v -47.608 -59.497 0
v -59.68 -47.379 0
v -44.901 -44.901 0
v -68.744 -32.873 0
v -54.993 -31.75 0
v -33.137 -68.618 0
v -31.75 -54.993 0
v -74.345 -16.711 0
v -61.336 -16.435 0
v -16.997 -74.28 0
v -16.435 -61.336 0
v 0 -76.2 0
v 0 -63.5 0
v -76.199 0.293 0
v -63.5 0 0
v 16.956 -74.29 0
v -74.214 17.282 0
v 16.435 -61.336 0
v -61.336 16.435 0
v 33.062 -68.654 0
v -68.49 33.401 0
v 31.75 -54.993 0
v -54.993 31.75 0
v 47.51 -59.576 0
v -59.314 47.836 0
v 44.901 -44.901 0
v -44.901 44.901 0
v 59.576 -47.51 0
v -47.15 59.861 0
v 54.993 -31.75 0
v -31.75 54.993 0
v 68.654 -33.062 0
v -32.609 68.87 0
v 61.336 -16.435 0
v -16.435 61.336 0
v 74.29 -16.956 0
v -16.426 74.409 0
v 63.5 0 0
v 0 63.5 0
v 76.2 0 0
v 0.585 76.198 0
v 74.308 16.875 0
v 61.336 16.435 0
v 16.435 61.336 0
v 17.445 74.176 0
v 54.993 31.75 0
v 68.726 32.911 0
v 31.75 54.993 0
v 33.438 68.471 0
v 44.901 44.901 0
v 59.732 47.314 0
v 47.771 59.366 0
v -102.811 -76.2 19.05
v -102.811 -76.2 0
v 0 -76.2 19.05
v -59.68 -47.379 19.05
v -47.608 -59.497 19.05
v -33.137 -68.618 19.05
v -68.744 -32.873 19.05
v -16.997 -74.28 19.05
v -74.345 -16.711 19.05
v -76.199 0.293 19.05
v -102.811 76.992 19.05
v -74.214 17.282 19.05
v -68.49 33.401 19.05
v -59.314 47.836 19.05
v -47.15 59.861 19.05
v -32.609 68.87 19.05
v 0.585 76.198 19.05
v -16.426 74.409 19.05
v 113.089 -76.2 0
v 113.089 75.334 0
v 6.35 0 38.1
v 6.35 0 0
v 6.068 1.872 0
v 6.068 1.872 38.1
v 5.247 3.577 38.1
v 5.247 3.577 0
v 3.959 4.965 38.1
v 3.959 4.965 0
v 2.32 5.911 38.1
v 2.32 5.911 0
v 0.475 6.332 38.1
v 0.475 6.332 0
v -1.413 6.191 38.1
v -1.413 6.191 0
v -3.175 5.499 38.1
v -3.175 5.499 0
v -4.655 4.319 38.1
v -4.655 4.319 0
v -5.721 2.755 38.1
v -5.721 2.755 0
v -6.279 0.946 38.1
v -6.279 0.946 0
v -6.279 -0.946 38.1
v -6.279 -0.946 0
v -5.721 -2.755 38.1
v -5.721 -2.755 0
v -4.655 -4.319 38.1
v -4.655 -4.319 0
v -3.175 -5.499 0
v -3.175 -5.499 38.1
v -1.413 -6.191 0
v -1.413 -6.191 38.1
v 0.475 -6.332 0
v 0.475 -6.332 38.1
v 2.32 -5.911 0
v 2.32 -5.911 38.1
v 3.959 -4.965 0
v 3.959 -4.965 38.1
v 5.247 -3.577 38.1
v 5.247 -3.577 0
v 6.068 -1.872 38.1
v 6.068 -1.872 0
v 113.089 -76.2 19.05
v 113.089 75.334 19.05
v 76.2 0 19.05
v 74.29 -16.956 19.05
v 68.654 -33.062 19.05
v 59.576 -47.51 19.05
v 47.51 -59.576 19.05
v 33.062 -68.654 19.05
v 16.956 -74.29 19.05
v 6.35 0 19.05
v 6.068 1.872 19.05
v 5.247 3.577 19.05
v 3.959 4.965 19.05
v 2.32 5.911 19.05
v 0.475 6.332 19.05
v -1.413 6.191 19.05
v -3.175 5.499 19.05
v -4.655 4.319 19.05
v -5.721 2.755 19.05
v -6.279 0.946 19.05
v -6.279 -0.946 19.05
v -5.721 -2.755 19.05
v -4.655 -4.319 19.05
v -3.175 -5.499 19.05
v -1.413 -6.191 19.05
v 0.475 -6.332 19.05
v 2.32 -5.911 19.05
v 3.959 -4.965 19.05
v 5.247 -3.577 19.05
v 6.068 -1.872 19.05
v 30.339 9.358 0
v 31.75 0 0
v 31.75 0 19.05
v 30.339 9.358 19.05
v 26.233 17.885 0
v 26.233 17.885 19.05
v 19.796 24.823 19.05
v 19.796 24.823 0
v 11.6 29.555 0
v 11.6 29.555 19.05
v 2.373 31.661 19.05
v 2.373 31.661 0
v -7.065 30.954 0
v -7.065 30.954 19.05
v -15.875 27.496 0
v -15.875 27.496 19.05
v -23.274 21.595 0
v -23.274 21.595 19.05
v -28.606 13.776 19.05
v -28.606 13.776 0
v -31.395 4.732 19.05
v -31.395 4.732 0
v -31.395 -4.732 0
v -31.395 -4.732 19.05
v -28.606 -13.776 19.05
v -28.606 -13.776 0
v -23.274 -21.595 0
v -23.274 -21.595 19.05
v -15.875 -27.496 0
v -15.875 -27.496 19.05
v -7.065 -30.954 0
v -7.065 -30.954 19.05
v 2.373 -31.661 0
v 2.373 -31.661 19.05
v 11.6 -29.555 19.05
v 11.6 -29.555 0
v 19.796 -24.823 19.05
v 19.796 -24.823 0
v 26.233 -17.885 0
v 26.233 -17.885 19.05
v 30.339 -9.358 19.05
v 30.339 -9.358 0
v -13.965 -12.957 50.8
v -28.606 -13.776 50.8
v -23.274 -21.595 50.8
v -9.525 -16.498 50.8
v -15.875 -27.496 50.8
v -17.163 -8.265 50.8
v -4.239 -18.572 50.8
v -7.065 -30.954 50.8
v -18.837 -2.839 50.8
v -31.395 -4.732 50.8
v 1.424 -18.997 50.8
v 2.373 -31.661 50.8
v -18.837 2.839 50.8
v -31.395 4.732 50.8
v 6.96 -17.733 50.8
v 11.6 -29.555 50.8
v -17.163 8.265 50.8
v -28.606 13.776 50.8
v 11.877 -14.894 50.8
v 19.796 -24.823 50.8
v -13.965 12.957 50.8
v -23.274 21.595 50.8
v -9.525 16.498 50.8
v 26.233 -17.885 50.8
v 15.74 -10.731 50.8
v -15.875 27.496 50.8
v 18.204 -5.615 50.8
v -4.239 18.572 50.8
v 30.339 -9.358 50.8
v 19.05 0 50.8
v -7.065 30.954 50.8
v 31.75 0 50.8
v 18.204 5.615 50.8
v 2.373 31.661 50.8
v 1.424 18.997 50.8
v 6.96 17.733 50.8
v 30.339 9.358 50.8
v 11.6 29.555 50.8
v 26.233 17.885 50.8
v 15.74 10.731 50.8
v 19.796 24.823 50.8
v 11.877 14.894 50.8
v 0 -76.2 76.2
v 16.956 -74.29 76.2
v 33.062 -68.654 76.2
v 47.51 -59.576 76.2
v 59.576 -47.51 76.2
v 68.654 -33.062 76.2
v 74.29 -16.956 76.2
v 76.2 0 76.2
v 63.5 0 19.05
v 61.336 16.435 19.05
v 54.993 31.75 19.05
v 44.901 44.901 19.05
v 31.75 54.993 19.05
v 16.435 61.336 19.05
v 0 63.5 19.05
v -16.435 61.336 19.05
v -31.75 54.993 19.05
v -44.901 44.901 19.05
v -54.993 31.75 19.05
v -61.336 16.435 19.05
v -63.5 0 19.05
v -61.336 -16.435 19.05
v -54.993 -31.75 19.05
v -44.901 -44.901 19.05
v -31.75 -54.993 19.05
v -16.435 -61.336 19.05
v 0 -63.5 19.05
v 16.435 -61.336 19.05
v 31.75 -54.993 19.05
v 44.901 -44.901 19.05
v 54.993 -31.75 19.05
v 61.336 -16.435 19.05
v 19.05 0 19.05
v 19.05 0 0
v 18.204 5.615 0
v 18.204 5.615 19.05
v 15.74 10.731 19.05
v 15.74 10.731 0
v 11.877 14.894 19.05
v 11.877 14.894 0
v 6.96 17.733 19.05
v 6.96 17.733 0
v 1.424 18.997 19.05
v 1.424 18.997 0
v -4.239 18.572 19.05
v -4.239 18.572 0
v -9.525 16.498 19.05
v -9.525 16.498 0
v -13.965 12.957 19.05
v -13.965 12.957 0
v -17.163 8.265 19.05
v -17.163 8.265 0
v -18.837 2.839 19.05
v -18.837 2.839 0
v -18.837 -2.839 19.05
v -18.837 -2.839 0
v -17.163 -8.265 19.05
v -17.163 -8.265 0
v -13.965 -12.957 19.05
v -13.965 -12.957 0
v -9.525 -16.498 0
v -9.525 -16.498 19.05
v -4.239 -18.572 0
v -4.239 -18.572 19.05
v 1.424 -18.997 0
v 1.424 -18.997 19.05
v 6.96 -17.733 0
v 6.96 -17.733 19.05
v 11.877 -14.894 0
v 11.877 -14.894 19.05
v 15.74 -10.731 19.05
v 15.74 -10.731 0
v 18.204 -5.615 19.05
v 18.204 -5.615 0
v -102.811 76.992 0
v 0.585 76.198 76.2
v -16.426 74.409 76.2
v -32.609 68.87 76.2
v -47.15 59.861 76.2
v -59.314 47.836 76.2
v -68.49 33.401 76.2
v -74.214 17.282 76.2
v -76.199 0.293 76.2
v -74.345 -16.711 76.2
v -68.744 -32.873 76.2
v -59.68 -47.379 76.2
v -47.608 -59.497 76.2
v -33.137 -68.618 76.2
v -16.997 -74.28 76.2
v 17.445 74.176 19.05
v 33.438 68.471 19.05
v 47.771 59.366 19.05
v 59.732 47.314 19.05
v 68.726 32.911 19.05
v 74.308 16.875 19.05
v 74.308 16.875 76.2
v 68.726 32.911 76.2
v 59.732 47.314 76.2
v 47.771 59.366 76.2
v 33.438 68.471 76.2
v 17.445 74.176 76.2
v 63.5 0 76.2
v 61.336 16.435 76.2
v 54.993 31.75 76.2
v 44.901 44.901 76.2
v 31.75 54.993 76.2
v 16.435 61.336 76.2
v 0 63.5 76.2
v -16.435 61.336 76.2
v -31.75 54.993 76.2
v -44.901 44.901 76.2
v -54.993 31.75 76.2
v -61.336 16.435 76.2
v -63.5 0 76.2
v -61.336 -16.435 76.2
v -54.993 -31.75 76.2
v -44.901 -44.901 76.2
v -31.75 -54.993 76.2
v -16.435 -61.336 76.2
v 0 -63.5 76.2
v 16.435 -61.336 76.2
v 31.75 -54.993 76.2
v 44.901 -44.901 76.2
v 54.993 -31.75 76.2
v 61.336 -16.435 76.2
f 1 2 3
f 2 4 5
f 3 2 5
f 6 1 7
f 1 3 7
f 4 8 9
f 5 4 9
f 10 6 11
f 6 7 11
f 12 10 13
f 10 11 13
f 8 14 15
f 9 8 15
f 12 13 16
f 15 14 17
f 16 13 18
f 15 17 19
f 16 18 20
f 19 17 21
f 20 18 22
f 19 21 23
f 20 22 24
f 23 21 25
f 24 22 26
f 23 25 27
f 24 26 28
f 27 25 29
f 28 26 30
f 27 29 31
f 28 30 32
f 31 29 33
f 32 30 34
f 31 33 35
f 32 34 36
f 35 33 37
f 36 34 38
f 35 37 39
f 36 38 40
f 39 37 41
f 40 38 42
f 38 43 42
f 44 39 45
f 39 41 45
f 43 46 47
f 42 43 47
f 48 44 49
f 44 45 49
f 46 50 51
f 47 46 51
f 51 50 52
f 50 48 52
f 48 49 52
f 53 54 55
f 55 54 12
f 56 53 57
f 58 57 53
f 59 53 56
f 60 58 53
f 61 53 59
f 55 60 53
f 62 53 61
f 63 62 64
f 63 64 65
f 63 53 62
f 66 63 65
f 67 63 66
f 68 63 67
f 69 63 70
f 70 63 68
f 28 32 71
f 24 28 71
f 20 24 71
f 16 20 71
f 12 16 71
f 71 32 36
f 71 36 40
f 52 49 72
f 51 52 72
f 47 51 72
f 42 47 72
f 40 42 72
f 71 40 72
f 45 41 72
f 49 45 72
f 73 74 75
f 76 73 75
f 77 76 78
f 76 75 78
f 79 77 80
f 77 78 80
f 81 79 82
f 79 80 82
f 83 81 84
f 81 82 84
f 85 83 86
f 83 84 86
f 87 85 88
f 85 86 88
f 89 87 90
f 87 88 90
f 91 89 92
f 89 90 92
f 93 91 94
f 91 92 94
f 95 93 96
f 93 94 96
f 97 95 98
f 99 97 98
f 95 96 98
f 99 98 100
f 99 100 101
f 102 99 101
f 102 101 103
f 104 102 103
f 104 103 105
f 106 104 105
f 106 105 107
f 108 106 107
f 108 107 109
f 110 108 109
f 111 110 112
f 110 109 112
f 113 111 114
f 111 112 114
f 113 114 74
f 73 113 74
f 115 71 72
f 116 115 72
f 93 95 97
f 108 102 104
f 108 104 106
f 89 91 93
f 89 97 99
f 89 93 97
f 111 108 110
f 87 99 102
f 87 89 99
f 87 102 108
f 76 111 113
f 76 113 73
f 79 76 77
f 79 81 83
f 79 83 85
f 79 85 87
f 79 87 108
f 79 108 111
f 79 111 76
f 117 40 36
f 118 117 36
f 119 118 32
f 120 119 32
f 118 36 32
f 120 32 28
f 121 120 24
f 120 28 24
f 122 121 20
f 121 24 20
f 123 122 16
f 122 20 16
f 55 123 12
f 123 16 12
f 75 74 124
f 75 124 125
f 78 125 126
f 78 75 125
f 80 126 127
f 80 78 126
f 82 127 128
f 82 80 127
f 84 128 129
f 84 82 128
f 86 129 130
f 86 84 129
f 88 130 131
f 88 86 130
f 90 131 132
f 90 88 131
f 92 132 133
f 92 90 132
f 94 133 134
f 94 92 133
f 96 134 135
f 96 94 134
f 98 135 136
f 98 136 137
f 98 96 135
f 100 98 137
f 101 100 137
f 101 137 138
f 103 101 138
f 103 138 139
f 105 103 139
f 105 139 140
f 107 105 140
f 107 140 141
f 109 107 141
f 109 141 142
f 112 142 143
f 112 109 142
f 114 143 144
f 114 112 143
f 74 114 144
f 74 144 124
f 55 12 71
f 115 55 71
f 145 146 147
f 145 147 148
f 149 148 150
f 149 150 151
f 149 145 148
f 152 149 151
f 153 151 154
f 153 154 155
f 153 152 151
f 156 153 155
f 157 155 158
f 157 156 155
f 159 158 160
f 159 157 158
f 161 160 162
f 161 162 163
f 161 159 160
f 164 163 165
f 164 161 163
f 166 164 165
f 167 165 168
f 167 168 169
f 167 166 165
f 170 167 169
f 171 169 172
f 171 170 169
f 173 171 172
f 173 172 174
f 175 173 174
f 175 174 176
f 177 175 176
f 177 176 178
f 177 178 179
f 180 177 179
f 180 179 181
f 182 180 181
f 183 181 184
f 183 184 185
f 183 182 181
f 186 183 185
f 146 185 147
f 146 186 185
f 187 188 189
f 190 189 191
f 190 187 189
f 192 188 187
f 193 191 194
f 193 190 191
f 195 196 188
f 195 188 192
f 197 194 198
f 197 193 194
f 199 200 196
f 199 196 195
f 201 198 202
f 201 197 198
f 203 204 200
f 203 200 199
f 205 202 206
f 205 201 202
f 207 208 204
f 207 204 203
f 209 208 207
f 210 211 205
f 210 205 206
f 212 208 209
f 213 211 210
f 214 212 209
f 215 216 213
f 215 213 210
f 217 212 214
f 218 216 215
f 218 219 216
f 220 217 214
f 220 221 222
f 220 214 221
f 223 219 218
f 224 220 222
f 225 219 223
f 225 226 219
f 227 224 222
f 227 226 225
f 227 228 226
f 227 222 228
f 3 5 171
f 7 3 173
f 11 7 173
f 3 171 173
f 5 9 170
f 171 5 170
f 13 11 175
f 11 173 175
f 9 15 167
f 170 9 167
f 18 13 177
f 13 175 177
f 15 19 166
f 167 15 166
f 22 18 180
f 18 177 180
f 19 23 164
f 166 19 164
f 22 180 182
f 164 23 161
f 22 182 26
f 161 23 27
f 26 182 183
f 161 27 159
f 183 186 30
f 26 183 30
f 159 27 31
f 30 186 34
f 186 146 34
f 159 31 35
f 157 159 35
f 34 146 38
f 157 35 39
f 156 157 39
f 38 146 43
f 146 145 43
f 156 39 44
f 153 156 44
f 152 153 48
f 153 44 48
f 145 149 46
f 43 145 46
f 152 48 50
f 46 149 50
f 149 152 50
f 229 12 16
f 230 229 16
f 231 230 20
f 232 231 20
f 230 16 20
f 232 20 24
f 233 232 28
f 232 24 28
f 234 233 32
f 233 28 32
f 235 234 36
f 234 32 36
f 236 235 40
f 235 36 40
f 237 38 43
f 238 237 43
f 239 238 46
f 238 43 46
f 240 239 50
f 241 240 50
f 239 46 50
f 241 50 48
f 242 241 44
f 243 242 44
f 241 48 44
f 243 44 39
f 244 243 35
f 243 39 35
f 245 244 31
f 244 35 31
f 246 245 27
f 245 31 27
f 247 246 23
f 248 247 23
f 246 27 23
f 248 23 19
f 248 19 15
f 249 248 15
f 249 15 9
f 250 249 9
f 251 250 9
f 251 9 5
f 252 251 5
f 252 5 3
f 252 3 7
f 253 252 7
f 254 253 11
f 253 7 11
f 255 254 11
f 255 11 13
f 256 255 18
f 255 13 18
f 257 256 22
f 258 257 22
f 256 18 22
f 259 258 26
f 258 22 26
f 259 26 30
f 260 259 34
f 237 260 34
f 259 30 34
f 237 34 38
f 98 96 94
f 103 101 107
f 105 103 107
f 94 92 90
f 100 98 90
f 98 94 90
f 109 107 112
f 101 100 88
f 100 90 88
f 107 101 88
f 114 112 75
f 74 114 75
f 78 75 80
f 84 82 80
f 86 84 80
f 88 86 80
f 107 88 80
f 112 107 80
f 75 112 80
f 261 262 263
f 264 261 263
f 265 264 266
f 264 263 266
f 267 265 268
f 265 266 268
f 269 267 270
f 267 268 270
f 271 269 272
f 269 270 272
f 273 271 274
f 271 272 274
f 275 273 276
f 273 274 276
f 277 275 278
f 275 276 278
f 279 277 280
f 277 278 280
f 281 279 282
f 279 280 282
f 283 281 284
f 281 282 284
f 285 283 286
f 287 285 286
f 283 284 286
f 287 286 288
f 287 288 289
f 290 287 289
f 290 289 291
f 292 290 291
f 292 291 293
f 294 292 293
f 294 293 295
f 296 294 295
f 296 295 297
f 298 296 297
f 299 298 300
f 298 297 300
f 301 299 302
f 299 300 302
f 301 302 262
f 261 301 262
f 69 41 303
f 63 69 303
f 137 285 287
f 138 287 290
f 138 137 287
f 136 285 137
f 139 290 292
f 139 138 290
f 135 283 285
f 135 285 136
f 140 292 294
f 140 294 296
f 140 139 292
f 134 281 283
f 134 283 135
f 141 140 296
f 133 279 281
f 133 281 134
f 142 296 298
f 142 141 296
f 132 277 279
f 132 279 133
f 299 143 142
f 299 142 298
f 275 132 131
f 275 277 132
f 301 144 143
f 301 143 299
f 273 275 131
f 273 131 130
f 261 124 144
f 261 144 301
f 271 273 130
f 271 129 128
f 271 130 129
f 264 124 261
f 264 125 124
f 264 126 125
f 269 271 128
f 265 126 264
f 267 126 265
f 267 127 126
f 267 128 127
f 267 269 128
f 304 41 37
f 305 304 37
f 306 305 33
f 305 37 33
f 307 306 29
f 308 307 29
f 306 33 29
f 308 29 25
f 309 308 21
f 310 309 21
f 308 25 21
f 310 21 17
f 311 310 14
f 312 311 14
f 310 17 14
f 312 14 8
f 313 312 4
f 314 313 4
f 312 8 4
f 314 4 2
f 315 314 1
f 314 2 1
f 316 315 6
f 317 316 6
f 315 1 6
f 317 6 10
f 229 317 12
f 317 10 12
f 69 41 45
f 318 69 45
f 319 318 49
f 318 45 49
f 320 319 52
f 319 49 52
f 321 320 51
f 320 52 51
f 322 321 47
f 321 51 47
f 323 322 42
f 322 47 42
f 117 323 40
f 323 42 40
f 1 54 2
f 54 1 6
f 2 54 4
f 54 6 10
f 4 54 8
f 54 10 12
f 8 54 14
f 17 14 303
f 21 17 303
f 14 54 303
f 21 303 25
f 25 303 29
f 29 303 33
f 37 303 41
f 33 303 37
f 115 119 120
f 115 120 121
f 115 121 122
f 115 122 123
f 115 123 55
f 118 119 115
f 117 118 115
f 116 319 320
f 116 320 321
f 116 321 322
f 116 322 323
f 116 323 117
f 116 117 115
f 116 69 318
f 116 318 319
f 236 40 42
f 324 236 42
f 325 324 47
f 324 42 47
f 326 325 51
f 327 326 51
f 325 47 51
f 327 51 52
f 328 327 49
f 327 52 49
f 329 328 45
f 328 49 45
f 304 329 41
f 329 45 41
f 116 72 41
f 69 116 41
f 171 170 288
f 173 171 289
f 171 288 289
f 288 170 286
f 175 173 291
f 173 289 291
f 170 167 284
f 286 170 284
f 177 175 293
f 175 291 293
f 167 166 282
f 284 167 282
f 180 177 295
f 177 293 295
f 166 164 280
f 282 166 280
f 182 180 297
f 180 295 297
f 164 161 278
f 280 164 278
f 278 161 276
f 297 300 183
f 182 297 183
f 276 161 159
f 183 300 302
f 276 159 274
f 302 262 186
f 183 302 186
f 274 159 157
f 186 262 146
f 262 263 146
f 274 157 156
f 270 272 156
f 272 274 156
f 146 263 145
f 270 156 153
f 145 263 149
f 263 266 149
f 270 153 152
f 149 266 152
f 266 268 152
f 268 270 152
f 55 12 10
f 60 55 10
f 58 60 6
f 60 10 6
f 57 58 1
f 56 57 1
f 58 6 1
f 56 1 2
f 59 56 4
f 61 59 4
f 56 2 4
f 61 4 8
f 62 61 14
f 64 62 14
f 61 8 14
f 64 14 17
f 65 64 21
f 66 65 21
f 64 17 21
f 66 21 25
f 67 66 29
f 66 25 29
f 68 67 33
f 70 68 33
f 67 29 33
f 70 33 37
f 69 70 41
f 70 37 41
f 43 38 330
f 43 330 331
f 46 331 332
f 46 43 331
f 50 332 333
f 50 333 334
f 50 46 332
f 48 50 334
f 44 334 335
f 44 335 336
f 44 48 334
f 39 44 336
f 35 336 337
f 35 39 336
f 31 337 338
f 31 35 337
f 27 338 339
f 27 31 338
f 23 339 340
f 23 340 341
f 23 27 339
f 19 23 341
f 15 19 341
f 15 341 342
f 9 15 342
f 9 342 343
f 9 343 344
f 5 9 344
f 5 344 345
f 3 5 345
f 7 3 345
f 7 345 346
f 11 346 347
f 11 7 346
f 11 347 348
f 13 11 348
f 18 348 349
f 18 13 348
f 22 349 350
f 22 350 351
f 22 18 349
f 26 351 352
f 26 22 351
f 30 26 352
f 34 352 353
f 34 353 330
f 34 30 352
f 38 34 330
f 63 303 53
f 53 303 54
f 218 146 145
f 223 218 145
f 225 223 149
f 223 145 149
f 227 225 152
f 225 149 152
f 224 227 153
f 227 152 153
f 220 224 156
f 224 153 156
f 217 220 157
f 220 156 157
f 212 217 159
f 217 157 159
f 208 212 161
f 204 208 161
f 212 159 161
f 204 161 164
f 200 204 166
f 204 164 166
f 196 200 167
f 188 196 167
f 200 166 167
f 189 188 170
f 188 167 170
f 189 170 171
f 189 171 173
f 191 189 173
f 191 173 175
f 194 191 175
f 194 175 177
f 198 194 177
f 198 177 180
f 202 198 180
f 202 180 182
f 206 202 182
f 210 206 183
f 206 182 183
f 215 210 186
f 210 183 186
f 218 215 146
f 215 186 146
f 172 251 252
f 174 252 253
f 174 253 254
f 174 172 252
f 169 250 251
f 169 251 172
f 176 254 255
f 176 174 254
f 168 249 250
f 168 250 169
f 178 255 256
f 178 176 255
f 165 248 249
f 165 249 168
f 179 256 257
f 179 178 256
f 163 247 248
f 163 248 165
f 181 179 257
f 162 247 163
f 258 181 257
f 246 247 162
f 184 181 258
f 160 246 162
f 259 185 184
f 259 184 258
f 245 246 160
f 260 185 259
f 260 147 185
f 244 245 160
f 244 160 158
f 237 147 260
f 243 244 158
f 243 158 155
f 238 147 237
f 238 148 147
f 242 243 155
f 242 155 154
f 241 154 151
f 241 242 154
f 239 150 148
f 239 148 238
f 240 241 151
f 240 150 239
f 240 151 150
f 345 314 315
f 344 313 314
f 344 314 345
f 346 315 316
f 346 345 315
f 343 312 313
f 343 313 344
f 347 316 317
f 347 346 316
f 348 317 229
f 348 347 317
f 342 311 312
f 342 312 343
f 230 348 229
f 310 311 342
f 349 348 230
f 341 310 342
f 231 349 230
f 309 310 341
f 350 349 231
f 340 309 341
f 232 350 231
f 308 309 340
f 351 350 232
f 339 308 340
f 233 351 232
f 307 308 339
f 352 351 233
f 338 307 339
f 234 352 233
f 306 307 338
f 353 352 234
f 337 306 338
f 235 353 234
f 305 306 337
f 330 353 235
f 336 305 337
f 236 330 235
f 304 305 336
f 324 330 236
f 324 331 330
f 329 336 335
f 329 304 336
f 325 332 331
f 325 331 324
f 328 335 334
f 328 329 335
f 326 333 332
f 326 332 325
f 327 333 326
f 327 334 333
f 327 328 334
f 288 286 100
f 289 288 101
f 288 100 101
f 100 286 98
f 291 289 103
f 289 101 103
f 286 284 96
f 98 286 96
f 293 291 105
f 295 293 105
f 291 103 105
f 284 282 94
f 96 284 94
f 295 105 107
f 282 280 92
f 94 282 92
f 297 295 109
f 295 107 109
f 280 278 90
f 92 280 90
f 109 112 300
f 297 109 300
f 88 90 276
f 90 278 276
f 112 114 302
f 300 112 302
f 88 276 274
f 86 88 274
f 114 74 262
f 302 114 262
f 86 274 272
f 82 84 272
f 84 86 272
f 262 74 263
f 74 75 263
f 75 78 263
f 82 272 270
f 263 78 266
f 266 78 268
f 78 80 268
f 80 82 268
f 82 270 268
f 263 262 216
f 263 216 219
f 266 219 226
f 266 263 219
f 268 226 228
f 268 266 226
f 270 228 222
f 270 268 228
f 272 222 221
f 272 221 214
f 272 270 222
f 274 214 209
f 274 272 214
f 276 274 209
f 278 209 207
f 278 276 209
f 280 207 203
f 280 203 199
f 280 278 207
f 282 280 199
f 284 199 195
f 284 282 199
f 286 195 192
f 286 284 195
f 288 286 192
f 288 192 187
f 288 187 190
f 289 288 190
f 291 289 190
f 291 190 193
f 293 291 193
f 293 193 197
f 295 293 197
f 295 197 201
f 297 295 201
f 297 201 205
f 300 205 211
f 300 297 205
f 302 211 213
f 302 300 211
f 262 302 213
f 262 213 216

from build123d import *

# Parameters (mm, degrees)
F0_R     = 63.5
F1_DEPTH = 76.2
F0_R_2   = 31.75
F0_R_3   = 19.05
F2_DEPTH = 50.8
F0_R_4   = 6.35
F3_DEPTH = 38.1
F4_DEPTH = 19.05


with BuildPart() as f1:
    # F0 (on Top) → F1 (new body)
    with BuildSketch(Plane.XY):
        with BuildLine():
            ThreePointArc((0, -76.2), (53.881537, -53.881537), (76.2, 0))
            ThreePointArc((76.2, 0), (54.088073, 53.674206), (0.585292, 76.197752))
            ThreePointArc((0.585292, 76.197752), (-76.199438, 0.292648), (0, -76.2))
        make_face()
        Circle(F0_R, mode=Mode.SUBTRACT)
    extrude(amount=F1_DEPTH)


with BuildPart() as f2:
    # F0 (on Top) → F2 (new body)
    with BuildSketch(Plane.XY):
        Circle(F0_R_2)
        Circle(F0_R_3, mode=Mode.SUBTRACT)
    extrude(amount=F2_DEPTH)


with BuildPart() as f3:
    # F0 (on Top) → F3 (new body)
    with BuildSketch(Plane.XY):
        Circle(F0_R_4)
    extrude(amount=F3_DEPTH)


with BuildPart() as f4:
    # F0 (on Top) → F4 (new body)
    with BuildSketch(Plane.XY):
        with BuildLine():
            ThreePointArc((0, -76.2), (-76.199438, 0.292648), (0.585292, 76.197752))
            Line((0.585292, 76.197752), (-102.810882, 76.991962))
            Line((-102.810882, 76.991962), (-102.810882, -76.2))
            Line((-102.810882, -76.2), (0, -76.2))
        make_face()
        with BuildLine():
            ThreePointArc((0.585292, 76.197752), (54.088073, 53.674206), (76.2, 0))
            ThreePointArc((76.2, 0), (53.881537, -53.881537), (0, -76.2))
            Line((0, -76.2), (113.089118, -76.2))
            Line((113.089118, -76.2), (113.089118, 75.333584))
            Line((113.089118, 75.333584), (0.585292, 76.197752))
        make_face()
        Circle(F0_R)
        Circle(F0_R_2, mode=Mode.SUBTRACT)
        Circle(F0_R_3)
        Circle(F0_R_4, mode=Mode.SUBTRACT)
    extrude(amount=F4_DEPTH)


solid = Compound([f1.part, f2.part, f3.part, f4.part])
